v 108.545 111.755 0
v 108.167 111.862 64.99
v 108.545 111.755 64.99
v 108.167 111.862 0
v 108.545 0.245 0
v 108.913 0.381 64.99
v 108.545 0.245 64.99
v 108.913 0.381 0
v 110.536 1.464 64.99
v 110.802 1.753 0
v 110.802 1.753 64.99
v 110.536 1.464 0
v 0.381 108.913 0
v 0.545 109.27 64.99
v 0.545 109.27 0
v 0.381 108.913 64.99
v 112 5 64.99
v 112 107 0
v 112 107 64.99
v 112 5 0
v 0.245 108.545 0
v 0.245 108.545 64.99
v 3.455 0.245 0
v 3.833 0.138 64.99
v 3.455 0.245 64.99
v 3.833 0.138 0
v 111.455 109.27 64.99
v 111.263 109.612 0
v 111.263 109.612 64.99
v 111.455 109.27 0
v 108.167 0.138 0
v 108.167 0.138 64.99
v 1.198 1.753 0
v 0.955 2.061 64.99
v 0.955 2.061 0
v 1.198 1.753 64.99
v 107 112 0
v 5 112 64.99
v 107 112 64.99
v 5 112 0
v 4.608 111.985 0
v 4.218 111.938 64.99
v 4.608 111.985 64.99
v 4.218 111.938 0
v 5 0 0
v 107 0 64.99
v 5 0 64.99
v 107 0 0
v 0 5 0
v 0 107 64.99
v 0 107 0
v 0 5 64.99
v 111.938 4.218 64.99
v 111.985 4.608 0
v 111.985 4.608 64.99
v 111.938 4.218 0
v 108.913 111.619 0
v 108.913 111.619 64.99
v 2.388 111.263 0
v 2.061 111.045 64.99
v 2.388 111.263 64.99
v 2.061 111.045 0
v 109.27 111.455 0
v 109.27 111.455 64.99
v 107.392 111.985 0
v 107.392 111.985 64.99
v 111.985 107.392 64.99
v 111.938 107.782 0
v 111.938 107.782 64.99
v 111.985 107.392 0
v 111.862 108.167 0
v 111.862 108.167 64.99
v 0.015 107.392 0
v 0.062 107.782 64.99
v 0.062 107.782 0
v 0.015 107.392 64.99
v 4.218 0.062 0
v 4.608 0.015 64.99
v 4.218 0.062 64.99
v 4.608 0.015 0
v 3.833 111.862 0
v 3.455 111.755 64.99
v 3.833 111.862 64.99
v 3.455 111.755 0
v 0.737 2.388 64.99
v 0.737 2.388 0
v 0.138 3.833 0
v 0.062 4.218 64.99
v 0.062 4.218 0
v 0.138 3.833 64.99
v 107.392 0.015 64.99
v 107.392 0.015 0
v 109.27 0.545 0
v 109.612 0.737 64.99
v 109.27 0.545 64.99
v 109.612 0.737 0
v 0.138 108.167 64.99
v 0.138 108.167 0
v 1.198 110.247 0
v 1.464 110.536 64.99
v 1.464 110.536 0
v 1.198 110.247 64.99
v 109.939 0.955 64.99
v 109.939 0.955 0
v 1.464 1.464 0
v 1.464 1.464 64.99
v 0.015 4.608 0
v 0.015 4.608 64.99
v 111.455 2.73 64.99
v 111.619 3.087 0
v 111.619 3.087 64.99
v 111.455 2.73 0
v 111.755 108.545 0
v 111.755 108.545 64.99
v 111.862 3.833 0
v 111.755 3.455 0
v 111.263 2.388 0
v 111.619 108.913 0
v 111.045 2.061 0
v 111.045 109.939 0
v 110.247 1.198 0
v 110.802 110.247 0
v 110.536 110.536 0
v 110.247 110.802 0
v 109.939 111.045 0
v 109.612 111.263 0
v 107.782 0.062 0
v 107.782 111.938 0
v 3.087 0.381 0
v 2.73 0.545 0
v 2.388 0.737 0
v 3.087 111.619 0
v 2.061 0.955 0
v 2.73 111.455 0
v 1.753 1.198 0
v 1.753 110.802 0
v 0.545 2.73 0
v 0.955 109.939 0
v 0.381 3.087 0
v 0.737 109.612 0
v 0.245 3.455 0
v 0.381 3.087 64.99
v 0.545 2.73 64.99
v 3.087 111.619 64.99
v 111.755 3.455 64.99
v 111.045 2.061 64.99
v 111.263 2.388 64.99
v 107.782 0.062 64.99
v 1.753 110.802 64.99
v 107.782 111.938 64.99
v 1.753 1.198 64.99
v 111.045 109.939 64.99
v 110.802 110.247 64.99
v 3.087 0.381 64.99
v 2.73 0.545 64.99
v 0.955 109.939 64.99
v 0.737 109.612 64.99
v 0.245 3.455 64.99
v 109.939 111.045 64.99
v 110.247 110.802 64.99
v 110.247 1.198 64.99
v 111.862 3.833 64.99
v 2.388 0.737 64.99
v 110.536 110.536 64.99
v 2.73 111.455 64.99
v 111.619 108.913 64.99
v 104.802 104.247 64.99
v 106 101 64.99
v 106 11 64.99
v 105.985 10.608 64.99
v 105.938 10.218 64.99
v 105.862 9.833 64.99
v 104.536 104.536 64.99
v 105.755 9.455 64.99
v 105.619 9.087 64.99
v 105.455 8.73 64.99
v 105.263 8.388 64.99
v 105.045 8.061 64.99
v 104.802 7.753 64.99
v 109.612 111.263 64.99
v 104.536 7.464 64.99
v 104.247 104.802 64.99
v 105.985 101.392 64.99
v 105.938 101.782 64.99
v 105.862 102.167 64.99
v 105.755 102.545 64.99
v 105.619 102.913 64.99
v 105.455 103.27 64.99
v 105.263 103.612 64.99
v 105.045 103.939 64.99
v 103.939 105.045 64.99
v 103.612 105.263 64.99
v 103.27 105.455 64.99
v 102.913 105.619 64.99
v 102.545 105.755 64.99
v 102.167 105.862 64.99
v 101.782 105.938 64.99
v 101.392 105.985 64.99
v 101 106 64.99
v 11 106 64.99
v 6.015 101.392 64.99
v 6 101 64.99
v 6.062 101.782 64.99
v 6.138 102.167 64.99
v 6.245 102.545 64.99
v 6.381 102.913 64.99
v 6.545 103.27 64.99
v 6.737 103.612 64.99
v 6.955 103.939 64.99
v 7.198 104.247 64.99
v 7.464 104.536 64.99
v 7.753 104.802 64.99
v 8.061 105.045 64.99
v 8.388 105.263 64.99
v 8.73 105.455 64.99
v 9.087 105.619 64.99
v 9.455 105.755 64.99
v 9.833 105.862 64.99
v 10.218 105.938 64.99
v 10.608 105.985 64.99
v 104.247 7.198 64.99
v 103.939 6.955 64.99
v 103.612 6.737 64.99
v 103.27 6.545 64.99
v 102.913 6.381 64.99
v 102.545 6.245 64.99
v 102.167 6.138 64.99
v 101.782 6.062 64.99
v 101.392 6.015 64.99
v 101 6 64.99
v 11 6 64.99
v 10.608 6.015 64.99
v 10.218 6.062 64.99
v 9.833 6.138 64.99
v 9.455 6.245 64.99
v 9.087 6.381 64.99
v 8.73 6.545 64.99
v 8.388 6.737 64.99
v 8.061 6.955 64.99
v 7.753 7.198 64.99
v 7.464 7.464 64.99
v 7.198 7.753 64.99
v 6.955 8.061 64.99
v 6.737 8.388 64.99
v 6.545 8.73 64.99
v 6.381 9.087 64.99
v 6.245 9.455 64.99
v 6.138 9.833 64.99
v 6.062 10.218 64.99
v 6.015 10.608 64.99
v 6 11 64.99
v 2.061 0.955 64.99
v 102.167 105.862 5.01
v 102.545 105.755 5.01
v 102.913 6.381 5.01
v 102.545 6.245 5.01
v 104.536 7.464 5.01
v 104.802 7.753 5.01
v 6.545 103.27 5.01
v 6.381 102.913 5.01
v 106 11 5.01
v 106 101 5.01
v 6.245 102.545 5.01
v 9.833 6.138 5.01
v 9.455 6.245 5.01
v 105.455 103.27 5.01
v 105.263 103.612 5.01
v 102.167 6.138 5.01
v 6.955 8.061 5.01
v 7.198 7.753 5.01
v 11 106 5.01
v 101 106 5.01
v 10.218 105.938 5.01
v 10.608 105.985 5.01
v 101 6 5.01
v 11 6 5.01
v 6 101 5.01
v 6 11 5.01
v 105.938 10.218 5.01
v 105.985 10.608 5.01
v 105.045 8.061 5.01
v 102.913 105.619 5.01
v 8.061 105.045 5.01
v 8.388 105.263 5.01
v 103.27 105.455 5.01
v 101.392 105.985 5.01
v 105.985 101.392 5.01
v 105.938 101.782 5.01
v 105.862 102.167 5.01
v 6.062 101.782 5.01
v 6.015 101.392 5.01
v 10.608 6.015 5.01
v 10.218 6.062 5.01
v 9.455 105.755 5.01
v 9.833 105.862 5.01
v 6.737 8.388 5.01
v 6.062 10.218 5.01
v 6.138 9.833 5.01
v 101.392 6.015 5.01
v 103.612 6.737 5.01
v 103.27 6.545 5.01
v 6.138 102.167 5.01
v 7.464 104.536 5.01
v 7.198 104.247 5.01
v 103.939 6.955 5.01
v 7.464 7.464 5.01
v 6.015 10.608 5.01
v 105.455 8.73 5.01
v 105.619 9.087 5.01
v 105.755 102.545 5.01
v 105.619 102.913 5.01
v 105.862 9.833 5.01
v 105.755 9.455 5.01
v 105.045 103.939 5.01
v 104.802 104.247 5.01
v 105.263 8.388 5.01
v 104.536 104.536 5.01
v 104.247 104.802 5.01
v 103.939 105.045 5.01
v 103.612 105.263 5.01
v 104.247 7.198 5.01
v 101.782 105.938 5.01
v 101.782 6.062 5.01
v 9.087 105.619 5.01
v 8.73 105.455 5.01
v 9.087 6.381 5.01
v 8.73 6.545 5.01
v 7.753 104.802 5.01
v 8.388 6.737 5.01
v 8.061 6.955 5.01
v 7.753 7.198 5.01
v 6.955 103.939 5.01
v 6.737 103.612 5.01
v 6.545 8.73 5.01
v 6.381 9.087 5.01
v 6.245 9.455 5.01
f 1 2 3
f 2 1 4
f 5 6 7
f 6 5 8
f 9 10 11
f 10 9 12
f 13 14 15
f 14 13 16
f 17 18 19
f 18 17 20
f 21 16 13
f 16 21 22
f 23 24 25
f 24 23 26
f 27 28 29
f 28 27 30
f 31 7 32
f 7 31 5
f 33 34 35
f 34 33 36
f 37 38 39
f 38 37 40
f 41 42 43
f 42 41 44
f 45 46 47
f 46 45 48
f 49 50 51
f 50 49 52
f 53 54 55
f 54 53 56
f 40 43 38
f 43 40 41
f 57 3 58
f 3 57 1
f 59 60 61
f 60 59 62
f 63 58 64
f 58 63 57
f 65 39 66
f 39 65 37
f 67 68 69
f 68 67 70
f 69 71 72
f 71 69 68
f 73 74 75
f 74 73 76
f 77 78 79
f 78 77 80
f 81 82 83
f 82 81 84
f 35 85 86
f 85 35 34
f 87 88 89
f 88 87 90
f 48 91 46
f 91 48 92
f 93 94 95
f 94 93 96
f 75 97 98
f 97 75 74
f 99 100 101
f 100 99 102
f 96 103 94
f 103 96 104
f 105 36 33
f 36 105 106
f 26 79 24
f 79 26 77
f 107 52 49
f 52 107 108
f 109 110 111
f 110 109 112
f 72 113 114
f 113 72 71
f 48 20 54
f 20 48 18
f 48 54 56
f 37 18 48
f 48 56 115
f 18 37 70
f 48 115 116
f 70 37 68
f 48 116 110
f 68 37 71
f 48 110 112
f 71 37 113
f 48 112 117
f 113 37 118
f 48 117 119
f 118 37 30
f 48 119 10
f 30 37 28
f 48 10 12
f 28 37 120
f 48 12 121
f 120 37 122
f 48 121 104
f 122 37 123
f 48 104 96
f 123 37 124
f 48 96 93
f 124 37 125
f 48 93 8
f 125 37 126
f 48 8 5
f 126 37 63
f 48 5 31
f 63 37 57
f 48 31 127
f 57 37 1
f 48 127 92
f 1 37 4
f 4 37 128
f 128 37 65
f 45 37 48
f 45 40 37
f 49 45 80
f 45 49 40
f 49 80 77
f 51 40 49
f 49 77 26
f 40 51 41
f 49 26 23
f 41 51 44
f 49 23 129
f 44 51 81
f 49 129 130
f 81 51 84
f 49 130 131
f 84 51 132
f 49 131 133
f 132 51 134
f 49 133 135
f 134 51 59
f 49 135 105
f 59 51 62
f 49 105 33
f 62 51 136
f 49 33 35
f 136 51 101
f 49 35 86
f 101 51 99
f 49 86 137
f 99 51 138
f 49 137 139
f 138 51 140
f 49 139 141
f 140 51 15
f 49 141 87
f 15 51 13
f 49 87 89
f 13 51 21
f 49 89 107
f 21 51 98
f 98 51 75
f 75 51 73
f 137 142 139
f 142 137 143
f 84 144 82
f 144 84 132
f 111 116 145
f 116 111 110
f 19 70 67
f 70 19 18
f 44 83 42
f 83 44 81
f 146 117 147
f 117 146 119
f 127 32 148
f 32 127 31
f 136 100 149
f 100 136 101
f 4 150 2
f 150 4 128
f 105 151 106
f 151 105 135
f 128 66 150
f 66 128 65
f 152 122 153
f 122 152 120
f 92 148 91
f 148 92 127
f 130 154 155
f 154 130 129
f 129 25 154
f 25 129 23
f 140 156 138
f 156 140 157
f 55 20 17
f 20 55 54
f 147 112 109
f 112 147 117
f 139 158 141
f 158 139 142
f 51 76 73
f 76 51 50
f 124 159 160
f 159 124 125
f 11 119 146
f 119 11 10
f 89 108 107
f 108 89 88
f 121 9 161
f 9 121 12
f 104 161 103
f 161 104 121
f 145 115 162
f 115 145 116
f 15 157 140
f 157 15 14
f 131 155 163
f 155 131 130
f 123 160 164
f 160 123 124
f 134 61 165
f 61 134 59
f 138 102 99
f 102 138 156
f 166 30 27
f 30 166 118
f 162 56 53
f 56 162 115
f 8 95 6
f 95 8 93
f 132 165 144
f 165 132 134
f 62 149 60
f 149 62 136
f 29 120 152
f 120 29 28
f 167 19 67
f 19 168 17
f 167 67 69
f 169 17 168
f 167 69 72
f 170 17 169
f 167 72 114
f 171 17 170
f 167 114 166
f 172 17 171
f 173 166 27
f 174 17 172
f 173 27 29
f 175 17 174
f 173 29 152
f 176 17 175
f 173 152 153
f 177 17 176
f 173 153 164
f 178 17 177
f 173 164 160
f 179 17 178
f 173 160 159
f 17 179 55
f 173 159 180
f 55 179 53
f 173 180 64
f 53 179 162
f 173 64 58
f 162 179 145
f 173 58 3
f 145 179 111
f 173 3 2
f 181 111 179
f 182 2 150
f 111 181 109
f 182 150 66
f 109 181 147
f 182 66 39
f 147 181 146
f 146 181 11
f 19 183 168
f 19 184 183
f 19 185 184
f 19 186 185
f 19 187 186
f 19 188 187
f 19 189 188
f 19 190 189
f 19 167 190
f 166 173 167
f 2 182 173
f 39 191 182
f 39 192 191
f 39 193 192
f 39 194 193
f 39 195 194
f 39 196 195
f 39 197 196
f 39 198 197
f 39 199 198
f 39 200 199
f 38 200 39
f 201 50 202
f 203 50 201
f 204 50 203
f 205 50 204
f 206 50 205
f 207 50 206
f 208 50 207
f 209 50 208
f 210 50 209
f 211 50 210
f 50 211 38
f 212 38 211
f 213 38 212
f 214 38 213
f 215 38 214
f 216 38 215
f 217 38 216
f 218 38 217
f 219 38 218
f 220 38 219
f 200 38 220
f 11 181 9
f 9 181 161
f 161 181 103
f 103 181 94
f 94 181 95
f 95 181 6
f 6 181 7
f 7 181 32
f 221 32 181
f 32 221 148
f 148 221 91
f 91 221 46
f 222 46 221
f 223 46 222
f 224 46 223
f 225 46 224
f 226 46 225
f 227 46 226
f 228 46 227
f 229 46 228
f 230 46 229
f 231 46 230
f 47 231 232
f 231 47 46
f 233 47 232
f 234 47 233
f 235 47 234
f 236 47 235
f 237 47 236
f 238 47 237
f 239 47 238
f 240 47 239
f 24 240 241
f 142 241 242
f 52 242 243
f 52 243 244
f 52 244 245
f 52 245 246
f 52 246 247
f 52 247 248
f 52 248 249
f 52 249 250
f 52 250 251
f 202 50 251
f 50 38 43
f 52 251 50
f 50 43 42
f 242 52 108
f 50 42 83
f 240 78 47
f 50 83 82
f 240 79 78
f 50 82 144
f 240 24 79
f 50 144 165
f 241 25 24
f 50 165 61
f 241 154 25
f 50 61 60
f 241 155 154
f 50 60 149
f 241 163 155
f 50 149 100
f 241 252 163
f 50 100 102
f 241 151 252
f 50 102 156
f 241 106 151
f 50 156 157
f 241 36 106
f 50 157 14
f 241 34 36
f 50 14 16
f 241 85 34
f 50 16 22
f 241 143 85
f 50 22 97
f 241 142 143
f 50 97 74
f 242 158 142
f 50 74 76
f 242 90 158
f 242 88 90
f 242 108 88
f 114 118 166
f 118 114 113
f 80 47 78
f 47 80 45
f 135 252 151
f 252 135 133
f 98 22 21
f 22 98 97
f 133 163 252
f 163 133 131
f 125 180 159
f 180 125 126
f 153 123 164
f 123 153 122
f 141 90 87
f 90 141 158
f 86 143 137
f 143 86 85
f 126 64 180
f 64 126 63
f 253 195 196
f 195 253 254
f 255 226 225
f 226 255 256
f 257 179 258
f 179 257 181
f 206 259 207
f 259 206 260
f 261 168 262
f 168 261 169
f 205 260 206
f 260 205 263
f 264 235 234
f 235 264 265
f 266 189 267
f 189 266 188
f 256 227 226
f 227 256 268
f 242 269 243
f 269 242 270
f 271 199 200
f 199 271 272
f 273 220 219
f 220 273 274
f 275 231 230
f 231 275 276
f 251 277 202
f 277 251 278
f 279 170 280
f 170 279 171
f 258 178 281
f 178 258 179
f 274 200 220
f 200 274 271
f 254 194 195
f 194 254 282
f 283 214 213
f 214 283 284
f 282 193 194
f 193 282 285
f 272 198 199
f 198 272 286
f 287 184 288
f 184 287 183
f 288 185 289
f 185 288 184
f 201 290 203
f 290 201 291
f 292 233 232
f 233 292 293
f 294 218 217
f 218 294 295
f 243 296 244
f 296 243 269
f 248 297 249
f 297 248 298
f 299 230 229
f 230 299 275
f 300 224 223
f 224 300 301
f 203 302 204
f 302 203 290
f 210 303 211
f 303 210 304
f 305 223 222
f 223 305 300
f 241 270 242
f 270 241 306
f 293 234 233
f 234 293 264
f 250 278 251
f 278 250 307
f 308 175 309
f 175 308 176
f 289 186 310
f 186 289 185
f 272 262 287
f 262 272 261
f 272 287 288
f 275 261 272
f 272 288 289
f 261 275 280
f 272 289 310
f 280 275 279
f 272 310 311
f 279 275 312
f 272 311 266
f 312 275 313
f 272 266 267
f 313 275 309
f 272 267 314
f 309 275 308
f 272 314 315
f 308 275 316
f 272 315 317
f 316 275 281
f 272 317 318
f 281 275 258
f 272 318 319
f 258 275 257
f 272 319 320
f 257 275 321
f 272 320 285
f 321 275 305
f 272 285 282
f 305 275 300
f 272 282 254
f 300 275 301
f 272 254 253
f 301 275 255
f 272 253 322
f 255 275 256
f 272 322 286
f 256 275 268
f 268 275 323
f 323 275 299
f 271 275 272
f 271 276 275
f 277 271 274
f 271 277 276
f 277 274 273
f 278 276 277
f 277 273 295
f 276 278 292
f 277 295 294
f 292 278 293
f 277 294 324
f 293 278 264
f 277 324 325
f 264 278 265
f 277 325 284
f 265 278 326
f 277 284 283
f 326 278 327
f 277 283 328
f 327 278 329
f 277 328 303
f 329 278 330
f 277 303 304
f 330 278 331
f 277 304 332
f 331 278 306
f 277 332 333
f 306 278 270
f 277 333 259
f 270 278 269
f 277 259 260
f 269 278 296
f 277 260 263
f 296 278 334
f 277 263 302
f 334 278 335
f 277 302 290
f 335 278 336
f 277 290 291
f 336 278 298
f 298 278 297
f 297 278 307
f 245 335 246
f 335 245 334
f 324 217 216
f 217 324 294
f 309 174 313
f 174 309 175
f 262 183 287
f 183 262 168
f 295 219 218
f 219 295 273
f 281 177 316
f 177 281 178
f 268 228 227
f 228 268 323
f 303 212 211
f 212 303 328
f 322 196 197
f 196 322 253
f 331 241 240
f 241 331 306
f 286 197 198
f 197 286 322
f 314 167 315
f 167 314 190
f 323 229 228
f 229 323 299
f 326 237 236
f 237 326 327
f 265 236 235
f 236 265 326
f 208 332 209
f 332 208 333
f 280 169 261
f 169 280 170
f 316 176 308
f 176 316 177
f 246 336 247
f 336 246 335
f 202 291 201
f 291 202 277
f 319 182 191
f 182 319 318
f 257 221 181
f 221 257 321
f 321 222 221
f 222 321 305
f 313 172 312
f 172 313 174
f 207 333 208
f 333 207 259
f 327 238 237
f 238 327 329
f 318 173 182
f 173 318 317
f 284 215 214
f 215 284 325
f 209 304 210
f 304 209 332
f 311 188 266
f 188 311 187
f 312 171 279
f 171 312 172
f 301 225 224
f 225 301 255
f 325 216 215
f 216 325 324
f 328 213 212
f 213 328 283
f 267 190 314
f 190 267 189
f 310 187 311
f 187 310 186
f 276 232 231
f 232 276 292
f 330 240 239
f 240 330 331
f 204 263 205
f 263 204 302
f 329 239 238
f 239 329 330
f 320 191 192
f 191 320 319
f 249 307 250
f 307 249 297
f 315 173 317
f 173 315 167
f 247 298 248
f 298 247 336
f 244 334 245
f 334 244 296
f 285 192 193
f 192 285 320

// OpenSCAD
/*
makerspace workshop 2023-09-02
author: andimoto
*/
$fn=80;

/* [box dimensions] */
innerBoxX = 100;
innerBoxY = 100;
innerBoxZ = 60;

wallThickness = 6;
bottomThickness = 5;

edgeRadius = 5;

/* [lid] */
lidThickness = 5;
lidClearance = 0.4;
lidFixZ = 1;

/* [screw dimensions] */
screwDia = 3;
screwDiaTolerance = 0.2;
screwLen = 12;
screwHeadDia = 6;
screwHeadThick = 3;

/* [other parameters] */
extra = 0.01;

module box()
{
  difference()
  {
    translate([edgeRadius,edgeRadius,0])
    minkowski()
    {
      cube([innerBoxX+wallThickness*2-edgeRadius*2,
        innerBoxY+wallThickness*2-edgeRadius*2,
        innerBoxZ+bottomThickness-extra*2]);
      cylinder(r=edgeRadius, h=extra);
    }

    translate([edgeRadius+wallThickness,edgeRadius+wallThickness,bottomThickness+extra])
    minkowski()
    {
      cube([innerBoxX-edgeRadius*2,
        innerBoxY-edgeRadius*2,
        innerBoxZ-extra*2]);
      cylinder(r=edgeRadius, h=extra);
    }

    translate([0,0,innerBoxZ+bottomThickness])
    translate([0,0,screwHeadThick+0.2])
    mirror([0,0,1])
    screws(screwDia+screwDiaTolerance,screwHeadDia,screwHeadThick);
  }
}

box();


module lid()
{
  difference()
  {
    union()
    {
      translate([edgeRadius,edgeRadius,0])
      minkowski()
      {
        cube([innerBoxX+wallThickness*2-edgeRadius*2,
          innerBoxY+wallThickness*2-edgeRadius*2,
          lidThickness-extra*2]);
        cylinder(r=edgeRadius, h=extra);
      }
      translate([edgeRadius+wallThickness+lidClearance,
        edgeRadius+wallThickness+lidClearance,0])
      minkowski()
      {
        cube([innerBoxX-lidClearance*2-edgeRadius*2,
          innerBoxY-lidClearance*2-edgeRadius*2,
          lidFixZ+lidThickness-extra*2]);
        cylinder(r=edgeRadius, h=extra);
      }
    } /* union */

    translate([0,0,-extra])
    screws(screwDia+screwDiaTolerance*2,screwHeadDia,screwHeadThick+0.5);

  }
}
/* lid(); */

/* --- liste mit platzierung der schrauben --- */

/* screws(screwDia+screwDiaTolerance,screwHeadDia,screwHeadThick+0.5); */
module screws(screwD = 3, screwHeadD = 6, screwHeadThickness = 3)
{
  /* for loop für platzierung der schrauben */

}

/* screw(screwD=3, screwHeadD = 6, screwHeadThickness =3); */
module screw(screwD = 3, screwHeadD = 6, screwHeadThickness = 3)
{
  union()
  {
    /* head */
    cylinder(r=screwHeadD/2, h=screwHeadThickness);
    /* screw */
    translate([0,0,screwHeadThickness+0.2])
    cylinder(r = screwD/2, h=screwLen);

    translate([0,0,screwHeadThickness])
    intersection()
    {
      cylinder(r=screwHeadD/2,h=0.2);
      translate([0,0,0.1])
        cube([screwHeadD,screwD,0.2],center=true);
    }
  }
}
